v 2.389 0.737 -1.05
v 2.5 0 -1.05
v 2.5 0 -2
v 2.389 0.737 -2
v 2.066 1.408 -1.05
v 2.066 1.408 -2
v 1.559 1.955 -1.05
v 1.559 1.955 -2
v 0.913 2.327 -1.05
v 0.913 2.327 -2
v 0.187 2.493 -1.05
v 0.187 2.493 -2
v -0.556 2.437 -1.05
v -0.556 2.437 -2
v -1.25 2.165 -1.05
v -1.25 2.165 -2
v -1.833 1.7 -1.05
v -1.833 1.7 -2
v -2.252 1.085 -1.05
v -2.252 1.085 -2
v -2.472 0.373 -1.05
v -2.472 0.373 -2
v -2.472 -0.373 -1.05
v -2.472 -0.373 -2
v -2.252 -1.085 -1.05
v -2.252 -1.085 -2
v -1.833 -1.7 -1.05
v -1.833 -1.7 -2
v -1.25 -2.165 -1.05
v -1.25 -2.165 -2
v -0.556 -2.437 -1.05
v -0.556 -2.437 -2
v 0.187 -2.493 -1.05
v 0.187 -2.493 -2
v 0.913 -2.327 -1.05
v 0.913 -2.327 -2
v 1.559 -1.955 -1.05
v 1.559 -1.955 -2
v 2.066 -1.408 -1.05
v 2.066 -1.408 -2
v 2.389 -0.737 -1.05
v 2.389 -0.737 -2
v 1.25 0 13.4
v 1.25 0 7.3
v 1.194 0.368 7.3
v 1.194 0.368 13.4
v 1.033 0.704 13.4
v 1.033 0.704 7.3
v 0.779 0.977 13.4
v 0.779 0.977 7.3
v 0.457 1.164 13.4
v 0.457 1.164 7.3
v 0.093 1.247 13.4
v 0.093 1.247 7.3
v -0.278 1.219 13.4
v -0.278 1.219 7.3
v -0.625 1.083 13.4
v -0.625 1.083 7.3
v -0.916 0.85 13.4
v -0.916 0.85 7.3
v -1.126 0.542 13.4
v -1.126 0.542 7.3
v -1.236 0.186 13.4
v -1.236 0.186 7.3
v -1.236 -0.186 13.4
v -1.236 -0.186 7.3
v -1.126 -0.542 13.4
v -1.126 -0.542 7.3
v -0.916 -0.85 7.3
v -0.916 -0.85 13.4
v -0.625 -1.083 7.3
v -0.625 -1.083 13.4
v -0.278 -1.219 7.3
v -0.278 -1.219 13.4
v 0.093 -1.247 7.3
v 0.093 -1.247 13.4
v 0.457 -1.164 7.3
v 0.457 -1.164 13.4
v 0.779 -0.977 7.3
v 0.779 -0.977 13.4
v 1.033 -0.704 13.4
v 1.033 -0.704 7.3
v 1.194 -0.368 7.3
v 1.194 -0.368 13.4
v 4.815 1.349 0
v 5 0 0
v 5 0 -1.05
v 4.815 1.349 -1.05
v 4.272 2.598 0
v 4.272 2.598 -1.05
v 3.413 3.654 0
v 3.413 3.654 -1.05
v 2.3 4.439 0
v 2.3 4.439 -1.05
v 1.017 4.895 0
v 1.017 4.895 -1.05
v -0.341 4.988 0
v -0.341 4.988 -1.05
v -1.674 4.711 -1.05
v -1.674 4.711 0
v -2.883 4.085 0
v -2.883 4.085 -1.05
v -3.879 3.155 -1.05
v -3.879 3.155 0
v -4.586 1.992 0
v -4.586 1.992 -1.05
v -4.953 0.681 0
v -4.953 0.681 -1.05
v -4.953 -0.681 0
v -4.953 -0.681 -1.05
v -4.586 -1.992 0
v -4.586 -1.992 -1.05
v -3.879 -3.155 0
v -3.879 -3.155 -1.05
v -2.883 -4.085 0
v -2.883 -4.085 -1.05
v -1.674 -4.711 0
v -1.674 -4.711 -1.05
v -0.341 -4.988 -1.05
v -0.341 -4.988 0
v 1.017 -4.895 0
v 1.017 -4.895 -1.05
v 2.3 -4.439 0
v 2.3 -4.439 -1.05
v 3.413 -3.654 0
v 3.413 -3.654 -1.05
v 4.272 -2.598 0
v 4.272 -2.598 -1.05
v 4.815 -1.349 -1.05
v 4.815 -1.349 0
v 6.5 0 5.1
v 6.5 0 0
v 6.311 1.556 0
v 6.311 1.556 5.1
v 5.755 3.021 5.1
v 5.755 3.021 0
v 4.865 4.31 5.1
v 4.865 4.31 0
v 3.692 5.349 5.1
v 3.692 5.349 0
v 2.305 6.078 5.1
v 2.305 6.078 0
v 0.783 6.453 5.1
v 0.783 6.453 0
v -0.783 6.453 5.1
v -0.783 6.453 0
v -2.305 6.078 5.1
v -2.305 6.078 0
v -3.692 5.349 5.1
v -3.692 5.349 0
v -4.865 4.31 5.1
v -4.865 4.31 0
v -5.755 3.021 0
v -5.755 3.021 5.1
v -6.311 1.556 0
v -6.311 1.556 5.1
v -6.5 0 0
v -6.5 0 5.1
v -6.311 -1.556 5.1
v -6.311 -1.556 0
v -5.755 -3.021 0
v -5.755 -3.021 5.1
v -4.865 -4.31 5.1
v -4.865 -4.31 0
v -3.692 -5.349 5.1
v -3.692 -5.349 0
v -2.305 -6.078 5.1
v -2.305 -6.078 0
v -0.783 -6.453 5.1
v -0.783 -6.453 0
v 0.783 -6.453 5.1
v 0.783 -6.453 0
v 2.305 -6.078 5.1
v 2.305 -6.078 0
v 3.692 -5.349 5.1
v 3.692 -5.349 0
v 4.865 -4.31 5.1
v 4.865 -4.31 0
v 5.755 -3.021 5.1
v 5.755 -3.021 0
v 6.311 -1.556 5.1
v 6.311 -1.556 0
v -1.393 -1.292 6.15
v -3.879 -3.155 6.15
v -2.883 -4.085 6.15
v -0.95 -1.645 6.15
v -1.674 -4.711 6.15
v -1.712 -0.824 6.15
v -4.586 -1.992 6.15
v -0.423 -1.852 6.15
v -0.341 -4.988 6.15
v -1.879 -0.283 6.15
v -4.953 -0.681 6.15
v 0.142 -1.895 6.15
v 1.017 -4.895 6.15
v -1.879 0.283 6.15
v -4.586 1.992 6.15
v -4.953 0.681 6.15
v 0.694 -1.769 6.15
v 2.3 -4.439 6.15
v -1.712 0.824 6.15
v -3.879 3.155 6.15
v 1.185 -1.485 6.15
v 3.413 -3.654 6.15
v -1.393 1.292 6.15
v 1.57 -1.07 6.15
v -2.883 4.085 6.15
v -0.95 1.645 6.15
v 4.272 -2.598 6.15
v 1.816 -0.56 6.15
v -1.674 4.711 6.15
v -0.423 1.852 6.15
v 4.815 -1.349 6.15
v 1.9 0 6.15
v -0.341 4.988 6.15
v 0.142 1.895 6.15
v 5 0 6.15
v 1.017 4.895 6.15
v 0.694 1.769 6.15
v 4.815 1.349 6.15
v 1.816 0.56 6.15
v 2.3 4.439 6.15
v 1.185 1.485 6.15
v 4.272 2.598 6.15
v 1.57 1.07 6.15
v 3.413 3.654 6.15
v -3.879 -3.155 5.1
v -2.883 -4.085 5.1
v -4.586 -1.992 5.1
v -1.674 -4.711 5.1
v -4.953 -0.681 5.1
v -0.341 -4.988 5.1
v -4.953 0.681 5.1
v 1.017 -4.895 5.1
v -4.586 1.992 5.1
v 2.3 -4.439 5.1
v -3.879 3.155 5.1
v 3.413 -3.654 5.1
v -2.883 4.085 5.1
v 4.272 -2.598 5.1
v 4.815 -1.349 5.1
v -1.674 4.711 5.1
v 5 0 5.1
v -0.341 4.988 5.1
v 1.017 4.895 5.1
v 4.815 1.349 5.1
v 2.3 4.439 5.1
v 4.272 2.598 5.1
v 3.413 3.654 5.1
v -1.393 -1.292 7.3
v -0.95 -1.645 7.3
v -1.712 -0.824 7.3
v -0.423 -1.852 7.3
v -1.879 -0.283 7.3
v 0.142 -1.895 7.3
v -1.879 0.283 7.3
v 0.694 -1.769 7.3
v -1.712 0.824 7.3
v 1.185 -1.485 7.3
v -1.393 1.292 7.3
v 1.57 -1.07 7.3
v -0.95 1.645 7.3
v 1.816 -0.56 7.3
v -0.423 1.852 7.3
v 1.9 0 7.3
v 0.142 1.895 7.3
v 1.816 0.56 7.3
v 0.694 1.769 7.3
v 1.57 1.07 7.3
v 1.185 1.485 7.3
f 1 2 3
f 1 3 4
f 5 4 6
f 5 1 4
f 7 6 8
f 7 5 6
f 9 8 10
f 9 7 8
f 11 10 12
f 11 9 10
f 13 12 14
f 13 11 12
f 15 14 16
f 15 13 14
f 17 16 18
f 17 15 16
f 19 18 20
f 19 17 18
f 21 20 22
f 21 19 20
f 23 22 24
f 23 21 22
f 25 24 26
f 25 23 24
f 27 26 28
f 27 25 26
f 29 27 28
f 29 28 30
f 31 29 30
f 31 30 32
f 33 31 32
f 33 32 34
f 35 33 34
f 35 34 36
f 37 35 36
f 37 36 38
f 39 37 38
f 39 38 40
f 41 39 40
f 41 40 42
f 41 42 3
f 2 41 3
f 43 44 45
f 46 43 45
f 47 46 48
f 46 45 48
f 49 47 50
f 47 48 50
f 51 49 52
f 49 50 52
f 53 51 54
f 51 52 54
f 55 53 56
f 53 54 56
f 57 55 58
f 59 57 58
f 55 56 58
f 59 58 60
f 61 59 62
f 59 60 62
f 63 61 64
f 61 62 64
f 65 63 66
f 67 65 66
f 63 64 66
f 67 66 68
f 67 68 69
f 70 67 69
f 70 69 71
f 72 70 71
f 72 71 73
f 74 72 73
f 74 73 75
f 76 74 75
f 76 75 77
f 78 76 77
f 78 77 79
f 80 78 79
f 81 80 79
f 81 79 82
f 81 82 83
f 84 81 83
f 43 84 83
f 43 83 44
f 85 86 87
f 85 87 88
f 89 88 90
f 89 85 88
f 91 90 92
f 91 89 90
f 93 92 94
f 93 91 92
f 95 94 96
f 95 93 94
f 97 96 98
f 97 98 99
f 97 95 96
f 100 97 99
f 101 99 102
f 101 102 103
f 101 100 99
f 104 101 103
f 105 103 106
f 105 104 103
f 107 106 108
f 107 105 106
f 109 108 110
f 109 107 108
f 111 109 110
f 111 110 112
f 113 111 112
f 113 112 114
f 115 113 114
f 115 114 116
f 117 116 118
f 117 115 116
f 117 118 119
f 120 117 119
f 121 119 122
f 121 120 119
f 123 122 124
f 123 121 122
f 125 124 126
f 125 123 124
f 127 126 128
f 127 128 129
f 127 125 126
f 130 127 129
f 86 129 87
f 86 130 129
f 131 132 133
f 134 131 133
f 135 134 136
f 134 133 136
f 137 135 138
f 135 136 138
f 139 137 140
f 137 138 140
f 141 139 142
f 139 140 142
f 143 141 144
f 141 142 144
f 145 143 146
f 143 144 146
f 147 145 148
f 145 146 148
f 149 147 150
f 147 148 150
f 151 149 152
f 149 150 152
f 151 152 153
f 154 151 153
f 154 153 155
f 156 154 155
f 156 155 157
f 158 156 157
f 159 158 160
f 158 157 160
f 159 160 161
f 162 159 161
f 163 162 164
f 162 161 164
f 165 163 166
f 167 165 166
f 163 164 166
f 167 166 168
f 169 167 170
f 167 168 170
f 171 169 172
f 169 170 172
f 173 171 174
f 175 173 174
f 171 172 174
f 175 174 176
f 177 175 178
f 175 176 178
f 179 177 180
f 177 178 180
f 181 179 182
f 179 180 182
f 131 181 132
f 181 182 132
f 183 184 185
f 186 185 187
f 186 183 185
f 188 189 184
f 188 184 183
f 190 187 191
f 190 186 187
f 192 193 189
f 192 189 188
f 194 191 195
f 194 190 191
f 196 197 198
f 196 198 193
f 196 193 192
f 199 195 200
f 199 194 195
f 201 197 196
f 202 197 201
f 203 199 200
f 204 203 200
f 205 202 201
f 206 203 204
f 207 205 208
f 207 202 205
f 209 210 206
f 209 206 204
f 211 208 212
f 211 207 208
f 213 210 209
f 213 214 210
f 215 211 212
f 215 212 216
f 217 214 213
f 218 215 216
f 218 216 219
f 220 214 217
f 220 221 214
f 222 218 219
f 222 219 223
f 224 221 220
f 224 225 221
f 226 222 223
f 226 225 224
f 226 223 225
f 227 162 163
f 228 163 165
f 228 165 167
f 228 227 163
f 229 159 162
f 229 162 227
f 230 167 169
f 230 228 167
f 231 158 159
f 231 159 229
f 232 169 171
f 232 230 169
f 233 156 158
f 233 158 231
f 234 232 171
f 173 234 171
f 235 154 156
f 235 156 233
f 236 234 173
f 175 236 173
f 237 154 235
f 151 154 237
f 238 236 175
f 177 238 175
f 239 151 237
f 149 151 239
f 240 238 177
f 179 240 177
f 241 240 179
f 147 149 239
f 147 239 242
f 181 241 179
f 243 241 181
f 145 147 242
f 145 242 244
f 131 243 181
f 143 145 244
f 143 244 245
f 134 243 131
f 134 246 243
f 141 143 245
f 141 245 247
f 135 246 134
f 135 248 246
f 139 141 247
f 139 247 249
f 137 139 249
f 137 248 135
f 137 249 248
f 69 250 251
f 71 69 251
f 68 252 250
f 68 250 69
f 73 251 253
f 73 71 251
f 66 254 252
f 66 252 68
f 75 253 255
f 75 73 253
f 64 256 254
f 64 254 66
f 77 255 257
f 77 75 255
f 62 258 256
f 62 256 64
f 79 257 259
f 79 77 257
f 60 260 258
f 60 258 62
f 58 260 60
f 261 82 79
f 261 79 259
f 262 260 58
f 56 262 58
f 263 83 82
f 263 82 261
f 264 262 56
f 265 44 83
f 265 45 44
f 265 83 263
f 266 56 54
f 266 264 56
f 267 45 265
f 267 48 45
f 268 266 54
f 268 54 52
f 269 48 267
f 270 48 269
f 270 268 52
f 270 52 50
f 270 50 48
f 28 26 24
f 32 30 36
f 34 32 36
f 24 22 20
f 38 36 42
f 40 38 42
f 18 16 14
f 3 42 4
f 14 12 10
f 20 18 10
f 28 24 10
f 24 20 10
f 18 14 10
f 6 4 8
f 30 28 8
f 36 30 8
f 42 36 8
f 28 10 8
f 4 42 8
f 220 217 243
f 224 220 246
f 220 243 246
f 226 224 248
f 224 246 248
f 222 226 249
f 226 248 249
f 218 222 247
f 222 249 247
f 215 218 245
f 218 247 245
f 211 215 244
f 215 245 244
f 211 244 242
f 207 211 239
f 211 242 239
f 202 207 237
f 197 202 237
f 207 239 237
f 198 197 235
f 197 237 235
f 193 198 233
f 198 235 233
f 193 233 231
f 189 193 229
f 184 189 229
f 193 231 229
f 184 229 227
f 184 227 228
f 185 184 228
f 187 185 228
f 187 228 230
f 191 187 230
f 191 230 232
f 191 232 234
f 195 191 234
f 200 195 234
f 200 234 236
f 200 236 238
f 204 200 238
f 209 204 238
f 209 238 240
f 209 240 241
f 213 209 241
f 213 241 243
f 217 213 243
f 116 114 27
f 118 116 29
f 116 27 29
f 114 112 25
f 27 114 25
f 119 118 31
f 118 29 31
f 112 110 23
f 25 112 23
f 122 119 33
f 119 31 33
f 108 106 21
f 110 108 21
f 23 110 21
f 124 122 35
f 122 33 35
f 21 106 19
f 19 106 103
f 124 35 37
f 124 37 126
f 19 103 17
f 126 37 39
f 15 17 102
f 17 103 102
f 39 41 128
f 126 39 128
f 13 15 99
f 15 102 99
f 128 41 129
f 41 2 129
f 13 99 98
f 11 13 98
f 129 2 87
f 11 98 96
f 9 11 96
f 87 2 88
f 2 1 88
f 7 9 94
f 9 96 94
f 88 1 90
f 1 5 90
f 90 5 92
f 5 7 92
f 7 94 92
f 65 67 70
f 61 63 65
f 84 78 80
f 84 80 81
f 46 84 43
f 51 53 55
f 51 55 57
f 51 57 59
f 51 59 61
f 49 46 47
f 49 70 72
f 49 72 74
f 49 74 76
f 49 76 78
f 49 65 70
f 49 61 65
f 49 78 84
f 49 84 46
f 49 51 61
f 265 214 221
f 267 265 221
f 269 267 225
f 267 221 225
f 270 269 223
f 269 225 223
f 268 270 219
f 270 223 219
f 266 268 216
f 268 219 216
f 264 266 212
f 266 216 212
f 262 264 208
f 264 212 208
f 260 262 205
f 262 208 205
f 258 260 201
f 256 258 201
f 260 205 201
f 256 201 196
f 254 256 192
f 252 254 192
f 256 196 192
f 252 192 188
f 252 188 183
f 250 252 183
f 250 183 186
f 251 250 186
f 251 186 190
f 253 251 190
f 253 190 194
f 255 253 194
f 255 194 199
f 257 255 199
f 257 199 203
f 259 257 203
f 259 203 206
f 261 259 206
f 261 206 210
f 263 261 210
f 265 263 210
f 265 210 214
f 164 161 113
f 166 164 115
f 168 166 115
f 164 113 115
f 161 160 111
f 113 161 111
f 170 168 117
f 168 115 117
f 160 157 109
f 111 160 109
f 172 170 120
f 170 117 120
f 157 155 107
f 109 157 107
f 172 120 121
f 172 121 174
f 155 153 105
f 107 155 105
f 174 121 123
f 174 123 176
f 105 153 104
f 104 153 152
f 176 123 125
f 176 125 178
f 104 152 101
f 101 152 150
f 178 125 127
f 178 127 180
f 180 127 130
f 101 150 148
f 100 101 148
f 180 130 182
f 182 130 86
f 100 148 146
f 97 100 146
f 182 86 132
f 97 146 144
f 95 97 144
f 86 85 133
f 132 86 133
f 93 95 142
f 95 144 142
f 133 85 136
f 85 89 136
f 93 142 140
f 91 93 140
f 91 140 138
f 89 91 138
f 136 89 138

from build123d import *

# Parameters (mm, degrees)
F0_R          = 6.5
F1_DEPTH      = 5.1
F2_R          = 5
F3_DEPTH      = 6.15
F3_DEPTH_BACK = 1.05
F4_R          = 1.9
F5_DEPTH      = 7.3
F6_R          = 2.5
F7_DEPTH      = 2
F8_R          = 1.25
F9_DEPTH      = 13.4


with BuildPart() as f1:
    # F0 (on Top) → F1 (new body)
    with BuildSketch(Plane.XY):
        Circle(F0_R)
    extrude(amount=F1_DEPTH)

    # F2 (on Top) → F3 (join, two sides)
    with BuildSketch(Plane.XY) as f3_sk:
        Circle(F2_R)
    extrude(amount=F3_DEPTH)
    extrude(f3_sk.sketch, amount=-F3_DEPTH_BACK)

    # F4 (on Top) → F5 (join)
    with BuildSketch(Plane.XY):
        Circle(F4_R)
    extrude(amount=F5_DEPTH)

    # F6 (on Top) → F7 (join)
    with BuildSketch(Plane.XY):
        Circle(F6_R)
    extrude(amount=-F7_DEPTH)

    # F8 (on Top) → F9 (join)
    with BuildSketch(Plane.XY):
        Circle(F8_R)
    extrude(amount=F9_DEPTH)


solid = f1.part
